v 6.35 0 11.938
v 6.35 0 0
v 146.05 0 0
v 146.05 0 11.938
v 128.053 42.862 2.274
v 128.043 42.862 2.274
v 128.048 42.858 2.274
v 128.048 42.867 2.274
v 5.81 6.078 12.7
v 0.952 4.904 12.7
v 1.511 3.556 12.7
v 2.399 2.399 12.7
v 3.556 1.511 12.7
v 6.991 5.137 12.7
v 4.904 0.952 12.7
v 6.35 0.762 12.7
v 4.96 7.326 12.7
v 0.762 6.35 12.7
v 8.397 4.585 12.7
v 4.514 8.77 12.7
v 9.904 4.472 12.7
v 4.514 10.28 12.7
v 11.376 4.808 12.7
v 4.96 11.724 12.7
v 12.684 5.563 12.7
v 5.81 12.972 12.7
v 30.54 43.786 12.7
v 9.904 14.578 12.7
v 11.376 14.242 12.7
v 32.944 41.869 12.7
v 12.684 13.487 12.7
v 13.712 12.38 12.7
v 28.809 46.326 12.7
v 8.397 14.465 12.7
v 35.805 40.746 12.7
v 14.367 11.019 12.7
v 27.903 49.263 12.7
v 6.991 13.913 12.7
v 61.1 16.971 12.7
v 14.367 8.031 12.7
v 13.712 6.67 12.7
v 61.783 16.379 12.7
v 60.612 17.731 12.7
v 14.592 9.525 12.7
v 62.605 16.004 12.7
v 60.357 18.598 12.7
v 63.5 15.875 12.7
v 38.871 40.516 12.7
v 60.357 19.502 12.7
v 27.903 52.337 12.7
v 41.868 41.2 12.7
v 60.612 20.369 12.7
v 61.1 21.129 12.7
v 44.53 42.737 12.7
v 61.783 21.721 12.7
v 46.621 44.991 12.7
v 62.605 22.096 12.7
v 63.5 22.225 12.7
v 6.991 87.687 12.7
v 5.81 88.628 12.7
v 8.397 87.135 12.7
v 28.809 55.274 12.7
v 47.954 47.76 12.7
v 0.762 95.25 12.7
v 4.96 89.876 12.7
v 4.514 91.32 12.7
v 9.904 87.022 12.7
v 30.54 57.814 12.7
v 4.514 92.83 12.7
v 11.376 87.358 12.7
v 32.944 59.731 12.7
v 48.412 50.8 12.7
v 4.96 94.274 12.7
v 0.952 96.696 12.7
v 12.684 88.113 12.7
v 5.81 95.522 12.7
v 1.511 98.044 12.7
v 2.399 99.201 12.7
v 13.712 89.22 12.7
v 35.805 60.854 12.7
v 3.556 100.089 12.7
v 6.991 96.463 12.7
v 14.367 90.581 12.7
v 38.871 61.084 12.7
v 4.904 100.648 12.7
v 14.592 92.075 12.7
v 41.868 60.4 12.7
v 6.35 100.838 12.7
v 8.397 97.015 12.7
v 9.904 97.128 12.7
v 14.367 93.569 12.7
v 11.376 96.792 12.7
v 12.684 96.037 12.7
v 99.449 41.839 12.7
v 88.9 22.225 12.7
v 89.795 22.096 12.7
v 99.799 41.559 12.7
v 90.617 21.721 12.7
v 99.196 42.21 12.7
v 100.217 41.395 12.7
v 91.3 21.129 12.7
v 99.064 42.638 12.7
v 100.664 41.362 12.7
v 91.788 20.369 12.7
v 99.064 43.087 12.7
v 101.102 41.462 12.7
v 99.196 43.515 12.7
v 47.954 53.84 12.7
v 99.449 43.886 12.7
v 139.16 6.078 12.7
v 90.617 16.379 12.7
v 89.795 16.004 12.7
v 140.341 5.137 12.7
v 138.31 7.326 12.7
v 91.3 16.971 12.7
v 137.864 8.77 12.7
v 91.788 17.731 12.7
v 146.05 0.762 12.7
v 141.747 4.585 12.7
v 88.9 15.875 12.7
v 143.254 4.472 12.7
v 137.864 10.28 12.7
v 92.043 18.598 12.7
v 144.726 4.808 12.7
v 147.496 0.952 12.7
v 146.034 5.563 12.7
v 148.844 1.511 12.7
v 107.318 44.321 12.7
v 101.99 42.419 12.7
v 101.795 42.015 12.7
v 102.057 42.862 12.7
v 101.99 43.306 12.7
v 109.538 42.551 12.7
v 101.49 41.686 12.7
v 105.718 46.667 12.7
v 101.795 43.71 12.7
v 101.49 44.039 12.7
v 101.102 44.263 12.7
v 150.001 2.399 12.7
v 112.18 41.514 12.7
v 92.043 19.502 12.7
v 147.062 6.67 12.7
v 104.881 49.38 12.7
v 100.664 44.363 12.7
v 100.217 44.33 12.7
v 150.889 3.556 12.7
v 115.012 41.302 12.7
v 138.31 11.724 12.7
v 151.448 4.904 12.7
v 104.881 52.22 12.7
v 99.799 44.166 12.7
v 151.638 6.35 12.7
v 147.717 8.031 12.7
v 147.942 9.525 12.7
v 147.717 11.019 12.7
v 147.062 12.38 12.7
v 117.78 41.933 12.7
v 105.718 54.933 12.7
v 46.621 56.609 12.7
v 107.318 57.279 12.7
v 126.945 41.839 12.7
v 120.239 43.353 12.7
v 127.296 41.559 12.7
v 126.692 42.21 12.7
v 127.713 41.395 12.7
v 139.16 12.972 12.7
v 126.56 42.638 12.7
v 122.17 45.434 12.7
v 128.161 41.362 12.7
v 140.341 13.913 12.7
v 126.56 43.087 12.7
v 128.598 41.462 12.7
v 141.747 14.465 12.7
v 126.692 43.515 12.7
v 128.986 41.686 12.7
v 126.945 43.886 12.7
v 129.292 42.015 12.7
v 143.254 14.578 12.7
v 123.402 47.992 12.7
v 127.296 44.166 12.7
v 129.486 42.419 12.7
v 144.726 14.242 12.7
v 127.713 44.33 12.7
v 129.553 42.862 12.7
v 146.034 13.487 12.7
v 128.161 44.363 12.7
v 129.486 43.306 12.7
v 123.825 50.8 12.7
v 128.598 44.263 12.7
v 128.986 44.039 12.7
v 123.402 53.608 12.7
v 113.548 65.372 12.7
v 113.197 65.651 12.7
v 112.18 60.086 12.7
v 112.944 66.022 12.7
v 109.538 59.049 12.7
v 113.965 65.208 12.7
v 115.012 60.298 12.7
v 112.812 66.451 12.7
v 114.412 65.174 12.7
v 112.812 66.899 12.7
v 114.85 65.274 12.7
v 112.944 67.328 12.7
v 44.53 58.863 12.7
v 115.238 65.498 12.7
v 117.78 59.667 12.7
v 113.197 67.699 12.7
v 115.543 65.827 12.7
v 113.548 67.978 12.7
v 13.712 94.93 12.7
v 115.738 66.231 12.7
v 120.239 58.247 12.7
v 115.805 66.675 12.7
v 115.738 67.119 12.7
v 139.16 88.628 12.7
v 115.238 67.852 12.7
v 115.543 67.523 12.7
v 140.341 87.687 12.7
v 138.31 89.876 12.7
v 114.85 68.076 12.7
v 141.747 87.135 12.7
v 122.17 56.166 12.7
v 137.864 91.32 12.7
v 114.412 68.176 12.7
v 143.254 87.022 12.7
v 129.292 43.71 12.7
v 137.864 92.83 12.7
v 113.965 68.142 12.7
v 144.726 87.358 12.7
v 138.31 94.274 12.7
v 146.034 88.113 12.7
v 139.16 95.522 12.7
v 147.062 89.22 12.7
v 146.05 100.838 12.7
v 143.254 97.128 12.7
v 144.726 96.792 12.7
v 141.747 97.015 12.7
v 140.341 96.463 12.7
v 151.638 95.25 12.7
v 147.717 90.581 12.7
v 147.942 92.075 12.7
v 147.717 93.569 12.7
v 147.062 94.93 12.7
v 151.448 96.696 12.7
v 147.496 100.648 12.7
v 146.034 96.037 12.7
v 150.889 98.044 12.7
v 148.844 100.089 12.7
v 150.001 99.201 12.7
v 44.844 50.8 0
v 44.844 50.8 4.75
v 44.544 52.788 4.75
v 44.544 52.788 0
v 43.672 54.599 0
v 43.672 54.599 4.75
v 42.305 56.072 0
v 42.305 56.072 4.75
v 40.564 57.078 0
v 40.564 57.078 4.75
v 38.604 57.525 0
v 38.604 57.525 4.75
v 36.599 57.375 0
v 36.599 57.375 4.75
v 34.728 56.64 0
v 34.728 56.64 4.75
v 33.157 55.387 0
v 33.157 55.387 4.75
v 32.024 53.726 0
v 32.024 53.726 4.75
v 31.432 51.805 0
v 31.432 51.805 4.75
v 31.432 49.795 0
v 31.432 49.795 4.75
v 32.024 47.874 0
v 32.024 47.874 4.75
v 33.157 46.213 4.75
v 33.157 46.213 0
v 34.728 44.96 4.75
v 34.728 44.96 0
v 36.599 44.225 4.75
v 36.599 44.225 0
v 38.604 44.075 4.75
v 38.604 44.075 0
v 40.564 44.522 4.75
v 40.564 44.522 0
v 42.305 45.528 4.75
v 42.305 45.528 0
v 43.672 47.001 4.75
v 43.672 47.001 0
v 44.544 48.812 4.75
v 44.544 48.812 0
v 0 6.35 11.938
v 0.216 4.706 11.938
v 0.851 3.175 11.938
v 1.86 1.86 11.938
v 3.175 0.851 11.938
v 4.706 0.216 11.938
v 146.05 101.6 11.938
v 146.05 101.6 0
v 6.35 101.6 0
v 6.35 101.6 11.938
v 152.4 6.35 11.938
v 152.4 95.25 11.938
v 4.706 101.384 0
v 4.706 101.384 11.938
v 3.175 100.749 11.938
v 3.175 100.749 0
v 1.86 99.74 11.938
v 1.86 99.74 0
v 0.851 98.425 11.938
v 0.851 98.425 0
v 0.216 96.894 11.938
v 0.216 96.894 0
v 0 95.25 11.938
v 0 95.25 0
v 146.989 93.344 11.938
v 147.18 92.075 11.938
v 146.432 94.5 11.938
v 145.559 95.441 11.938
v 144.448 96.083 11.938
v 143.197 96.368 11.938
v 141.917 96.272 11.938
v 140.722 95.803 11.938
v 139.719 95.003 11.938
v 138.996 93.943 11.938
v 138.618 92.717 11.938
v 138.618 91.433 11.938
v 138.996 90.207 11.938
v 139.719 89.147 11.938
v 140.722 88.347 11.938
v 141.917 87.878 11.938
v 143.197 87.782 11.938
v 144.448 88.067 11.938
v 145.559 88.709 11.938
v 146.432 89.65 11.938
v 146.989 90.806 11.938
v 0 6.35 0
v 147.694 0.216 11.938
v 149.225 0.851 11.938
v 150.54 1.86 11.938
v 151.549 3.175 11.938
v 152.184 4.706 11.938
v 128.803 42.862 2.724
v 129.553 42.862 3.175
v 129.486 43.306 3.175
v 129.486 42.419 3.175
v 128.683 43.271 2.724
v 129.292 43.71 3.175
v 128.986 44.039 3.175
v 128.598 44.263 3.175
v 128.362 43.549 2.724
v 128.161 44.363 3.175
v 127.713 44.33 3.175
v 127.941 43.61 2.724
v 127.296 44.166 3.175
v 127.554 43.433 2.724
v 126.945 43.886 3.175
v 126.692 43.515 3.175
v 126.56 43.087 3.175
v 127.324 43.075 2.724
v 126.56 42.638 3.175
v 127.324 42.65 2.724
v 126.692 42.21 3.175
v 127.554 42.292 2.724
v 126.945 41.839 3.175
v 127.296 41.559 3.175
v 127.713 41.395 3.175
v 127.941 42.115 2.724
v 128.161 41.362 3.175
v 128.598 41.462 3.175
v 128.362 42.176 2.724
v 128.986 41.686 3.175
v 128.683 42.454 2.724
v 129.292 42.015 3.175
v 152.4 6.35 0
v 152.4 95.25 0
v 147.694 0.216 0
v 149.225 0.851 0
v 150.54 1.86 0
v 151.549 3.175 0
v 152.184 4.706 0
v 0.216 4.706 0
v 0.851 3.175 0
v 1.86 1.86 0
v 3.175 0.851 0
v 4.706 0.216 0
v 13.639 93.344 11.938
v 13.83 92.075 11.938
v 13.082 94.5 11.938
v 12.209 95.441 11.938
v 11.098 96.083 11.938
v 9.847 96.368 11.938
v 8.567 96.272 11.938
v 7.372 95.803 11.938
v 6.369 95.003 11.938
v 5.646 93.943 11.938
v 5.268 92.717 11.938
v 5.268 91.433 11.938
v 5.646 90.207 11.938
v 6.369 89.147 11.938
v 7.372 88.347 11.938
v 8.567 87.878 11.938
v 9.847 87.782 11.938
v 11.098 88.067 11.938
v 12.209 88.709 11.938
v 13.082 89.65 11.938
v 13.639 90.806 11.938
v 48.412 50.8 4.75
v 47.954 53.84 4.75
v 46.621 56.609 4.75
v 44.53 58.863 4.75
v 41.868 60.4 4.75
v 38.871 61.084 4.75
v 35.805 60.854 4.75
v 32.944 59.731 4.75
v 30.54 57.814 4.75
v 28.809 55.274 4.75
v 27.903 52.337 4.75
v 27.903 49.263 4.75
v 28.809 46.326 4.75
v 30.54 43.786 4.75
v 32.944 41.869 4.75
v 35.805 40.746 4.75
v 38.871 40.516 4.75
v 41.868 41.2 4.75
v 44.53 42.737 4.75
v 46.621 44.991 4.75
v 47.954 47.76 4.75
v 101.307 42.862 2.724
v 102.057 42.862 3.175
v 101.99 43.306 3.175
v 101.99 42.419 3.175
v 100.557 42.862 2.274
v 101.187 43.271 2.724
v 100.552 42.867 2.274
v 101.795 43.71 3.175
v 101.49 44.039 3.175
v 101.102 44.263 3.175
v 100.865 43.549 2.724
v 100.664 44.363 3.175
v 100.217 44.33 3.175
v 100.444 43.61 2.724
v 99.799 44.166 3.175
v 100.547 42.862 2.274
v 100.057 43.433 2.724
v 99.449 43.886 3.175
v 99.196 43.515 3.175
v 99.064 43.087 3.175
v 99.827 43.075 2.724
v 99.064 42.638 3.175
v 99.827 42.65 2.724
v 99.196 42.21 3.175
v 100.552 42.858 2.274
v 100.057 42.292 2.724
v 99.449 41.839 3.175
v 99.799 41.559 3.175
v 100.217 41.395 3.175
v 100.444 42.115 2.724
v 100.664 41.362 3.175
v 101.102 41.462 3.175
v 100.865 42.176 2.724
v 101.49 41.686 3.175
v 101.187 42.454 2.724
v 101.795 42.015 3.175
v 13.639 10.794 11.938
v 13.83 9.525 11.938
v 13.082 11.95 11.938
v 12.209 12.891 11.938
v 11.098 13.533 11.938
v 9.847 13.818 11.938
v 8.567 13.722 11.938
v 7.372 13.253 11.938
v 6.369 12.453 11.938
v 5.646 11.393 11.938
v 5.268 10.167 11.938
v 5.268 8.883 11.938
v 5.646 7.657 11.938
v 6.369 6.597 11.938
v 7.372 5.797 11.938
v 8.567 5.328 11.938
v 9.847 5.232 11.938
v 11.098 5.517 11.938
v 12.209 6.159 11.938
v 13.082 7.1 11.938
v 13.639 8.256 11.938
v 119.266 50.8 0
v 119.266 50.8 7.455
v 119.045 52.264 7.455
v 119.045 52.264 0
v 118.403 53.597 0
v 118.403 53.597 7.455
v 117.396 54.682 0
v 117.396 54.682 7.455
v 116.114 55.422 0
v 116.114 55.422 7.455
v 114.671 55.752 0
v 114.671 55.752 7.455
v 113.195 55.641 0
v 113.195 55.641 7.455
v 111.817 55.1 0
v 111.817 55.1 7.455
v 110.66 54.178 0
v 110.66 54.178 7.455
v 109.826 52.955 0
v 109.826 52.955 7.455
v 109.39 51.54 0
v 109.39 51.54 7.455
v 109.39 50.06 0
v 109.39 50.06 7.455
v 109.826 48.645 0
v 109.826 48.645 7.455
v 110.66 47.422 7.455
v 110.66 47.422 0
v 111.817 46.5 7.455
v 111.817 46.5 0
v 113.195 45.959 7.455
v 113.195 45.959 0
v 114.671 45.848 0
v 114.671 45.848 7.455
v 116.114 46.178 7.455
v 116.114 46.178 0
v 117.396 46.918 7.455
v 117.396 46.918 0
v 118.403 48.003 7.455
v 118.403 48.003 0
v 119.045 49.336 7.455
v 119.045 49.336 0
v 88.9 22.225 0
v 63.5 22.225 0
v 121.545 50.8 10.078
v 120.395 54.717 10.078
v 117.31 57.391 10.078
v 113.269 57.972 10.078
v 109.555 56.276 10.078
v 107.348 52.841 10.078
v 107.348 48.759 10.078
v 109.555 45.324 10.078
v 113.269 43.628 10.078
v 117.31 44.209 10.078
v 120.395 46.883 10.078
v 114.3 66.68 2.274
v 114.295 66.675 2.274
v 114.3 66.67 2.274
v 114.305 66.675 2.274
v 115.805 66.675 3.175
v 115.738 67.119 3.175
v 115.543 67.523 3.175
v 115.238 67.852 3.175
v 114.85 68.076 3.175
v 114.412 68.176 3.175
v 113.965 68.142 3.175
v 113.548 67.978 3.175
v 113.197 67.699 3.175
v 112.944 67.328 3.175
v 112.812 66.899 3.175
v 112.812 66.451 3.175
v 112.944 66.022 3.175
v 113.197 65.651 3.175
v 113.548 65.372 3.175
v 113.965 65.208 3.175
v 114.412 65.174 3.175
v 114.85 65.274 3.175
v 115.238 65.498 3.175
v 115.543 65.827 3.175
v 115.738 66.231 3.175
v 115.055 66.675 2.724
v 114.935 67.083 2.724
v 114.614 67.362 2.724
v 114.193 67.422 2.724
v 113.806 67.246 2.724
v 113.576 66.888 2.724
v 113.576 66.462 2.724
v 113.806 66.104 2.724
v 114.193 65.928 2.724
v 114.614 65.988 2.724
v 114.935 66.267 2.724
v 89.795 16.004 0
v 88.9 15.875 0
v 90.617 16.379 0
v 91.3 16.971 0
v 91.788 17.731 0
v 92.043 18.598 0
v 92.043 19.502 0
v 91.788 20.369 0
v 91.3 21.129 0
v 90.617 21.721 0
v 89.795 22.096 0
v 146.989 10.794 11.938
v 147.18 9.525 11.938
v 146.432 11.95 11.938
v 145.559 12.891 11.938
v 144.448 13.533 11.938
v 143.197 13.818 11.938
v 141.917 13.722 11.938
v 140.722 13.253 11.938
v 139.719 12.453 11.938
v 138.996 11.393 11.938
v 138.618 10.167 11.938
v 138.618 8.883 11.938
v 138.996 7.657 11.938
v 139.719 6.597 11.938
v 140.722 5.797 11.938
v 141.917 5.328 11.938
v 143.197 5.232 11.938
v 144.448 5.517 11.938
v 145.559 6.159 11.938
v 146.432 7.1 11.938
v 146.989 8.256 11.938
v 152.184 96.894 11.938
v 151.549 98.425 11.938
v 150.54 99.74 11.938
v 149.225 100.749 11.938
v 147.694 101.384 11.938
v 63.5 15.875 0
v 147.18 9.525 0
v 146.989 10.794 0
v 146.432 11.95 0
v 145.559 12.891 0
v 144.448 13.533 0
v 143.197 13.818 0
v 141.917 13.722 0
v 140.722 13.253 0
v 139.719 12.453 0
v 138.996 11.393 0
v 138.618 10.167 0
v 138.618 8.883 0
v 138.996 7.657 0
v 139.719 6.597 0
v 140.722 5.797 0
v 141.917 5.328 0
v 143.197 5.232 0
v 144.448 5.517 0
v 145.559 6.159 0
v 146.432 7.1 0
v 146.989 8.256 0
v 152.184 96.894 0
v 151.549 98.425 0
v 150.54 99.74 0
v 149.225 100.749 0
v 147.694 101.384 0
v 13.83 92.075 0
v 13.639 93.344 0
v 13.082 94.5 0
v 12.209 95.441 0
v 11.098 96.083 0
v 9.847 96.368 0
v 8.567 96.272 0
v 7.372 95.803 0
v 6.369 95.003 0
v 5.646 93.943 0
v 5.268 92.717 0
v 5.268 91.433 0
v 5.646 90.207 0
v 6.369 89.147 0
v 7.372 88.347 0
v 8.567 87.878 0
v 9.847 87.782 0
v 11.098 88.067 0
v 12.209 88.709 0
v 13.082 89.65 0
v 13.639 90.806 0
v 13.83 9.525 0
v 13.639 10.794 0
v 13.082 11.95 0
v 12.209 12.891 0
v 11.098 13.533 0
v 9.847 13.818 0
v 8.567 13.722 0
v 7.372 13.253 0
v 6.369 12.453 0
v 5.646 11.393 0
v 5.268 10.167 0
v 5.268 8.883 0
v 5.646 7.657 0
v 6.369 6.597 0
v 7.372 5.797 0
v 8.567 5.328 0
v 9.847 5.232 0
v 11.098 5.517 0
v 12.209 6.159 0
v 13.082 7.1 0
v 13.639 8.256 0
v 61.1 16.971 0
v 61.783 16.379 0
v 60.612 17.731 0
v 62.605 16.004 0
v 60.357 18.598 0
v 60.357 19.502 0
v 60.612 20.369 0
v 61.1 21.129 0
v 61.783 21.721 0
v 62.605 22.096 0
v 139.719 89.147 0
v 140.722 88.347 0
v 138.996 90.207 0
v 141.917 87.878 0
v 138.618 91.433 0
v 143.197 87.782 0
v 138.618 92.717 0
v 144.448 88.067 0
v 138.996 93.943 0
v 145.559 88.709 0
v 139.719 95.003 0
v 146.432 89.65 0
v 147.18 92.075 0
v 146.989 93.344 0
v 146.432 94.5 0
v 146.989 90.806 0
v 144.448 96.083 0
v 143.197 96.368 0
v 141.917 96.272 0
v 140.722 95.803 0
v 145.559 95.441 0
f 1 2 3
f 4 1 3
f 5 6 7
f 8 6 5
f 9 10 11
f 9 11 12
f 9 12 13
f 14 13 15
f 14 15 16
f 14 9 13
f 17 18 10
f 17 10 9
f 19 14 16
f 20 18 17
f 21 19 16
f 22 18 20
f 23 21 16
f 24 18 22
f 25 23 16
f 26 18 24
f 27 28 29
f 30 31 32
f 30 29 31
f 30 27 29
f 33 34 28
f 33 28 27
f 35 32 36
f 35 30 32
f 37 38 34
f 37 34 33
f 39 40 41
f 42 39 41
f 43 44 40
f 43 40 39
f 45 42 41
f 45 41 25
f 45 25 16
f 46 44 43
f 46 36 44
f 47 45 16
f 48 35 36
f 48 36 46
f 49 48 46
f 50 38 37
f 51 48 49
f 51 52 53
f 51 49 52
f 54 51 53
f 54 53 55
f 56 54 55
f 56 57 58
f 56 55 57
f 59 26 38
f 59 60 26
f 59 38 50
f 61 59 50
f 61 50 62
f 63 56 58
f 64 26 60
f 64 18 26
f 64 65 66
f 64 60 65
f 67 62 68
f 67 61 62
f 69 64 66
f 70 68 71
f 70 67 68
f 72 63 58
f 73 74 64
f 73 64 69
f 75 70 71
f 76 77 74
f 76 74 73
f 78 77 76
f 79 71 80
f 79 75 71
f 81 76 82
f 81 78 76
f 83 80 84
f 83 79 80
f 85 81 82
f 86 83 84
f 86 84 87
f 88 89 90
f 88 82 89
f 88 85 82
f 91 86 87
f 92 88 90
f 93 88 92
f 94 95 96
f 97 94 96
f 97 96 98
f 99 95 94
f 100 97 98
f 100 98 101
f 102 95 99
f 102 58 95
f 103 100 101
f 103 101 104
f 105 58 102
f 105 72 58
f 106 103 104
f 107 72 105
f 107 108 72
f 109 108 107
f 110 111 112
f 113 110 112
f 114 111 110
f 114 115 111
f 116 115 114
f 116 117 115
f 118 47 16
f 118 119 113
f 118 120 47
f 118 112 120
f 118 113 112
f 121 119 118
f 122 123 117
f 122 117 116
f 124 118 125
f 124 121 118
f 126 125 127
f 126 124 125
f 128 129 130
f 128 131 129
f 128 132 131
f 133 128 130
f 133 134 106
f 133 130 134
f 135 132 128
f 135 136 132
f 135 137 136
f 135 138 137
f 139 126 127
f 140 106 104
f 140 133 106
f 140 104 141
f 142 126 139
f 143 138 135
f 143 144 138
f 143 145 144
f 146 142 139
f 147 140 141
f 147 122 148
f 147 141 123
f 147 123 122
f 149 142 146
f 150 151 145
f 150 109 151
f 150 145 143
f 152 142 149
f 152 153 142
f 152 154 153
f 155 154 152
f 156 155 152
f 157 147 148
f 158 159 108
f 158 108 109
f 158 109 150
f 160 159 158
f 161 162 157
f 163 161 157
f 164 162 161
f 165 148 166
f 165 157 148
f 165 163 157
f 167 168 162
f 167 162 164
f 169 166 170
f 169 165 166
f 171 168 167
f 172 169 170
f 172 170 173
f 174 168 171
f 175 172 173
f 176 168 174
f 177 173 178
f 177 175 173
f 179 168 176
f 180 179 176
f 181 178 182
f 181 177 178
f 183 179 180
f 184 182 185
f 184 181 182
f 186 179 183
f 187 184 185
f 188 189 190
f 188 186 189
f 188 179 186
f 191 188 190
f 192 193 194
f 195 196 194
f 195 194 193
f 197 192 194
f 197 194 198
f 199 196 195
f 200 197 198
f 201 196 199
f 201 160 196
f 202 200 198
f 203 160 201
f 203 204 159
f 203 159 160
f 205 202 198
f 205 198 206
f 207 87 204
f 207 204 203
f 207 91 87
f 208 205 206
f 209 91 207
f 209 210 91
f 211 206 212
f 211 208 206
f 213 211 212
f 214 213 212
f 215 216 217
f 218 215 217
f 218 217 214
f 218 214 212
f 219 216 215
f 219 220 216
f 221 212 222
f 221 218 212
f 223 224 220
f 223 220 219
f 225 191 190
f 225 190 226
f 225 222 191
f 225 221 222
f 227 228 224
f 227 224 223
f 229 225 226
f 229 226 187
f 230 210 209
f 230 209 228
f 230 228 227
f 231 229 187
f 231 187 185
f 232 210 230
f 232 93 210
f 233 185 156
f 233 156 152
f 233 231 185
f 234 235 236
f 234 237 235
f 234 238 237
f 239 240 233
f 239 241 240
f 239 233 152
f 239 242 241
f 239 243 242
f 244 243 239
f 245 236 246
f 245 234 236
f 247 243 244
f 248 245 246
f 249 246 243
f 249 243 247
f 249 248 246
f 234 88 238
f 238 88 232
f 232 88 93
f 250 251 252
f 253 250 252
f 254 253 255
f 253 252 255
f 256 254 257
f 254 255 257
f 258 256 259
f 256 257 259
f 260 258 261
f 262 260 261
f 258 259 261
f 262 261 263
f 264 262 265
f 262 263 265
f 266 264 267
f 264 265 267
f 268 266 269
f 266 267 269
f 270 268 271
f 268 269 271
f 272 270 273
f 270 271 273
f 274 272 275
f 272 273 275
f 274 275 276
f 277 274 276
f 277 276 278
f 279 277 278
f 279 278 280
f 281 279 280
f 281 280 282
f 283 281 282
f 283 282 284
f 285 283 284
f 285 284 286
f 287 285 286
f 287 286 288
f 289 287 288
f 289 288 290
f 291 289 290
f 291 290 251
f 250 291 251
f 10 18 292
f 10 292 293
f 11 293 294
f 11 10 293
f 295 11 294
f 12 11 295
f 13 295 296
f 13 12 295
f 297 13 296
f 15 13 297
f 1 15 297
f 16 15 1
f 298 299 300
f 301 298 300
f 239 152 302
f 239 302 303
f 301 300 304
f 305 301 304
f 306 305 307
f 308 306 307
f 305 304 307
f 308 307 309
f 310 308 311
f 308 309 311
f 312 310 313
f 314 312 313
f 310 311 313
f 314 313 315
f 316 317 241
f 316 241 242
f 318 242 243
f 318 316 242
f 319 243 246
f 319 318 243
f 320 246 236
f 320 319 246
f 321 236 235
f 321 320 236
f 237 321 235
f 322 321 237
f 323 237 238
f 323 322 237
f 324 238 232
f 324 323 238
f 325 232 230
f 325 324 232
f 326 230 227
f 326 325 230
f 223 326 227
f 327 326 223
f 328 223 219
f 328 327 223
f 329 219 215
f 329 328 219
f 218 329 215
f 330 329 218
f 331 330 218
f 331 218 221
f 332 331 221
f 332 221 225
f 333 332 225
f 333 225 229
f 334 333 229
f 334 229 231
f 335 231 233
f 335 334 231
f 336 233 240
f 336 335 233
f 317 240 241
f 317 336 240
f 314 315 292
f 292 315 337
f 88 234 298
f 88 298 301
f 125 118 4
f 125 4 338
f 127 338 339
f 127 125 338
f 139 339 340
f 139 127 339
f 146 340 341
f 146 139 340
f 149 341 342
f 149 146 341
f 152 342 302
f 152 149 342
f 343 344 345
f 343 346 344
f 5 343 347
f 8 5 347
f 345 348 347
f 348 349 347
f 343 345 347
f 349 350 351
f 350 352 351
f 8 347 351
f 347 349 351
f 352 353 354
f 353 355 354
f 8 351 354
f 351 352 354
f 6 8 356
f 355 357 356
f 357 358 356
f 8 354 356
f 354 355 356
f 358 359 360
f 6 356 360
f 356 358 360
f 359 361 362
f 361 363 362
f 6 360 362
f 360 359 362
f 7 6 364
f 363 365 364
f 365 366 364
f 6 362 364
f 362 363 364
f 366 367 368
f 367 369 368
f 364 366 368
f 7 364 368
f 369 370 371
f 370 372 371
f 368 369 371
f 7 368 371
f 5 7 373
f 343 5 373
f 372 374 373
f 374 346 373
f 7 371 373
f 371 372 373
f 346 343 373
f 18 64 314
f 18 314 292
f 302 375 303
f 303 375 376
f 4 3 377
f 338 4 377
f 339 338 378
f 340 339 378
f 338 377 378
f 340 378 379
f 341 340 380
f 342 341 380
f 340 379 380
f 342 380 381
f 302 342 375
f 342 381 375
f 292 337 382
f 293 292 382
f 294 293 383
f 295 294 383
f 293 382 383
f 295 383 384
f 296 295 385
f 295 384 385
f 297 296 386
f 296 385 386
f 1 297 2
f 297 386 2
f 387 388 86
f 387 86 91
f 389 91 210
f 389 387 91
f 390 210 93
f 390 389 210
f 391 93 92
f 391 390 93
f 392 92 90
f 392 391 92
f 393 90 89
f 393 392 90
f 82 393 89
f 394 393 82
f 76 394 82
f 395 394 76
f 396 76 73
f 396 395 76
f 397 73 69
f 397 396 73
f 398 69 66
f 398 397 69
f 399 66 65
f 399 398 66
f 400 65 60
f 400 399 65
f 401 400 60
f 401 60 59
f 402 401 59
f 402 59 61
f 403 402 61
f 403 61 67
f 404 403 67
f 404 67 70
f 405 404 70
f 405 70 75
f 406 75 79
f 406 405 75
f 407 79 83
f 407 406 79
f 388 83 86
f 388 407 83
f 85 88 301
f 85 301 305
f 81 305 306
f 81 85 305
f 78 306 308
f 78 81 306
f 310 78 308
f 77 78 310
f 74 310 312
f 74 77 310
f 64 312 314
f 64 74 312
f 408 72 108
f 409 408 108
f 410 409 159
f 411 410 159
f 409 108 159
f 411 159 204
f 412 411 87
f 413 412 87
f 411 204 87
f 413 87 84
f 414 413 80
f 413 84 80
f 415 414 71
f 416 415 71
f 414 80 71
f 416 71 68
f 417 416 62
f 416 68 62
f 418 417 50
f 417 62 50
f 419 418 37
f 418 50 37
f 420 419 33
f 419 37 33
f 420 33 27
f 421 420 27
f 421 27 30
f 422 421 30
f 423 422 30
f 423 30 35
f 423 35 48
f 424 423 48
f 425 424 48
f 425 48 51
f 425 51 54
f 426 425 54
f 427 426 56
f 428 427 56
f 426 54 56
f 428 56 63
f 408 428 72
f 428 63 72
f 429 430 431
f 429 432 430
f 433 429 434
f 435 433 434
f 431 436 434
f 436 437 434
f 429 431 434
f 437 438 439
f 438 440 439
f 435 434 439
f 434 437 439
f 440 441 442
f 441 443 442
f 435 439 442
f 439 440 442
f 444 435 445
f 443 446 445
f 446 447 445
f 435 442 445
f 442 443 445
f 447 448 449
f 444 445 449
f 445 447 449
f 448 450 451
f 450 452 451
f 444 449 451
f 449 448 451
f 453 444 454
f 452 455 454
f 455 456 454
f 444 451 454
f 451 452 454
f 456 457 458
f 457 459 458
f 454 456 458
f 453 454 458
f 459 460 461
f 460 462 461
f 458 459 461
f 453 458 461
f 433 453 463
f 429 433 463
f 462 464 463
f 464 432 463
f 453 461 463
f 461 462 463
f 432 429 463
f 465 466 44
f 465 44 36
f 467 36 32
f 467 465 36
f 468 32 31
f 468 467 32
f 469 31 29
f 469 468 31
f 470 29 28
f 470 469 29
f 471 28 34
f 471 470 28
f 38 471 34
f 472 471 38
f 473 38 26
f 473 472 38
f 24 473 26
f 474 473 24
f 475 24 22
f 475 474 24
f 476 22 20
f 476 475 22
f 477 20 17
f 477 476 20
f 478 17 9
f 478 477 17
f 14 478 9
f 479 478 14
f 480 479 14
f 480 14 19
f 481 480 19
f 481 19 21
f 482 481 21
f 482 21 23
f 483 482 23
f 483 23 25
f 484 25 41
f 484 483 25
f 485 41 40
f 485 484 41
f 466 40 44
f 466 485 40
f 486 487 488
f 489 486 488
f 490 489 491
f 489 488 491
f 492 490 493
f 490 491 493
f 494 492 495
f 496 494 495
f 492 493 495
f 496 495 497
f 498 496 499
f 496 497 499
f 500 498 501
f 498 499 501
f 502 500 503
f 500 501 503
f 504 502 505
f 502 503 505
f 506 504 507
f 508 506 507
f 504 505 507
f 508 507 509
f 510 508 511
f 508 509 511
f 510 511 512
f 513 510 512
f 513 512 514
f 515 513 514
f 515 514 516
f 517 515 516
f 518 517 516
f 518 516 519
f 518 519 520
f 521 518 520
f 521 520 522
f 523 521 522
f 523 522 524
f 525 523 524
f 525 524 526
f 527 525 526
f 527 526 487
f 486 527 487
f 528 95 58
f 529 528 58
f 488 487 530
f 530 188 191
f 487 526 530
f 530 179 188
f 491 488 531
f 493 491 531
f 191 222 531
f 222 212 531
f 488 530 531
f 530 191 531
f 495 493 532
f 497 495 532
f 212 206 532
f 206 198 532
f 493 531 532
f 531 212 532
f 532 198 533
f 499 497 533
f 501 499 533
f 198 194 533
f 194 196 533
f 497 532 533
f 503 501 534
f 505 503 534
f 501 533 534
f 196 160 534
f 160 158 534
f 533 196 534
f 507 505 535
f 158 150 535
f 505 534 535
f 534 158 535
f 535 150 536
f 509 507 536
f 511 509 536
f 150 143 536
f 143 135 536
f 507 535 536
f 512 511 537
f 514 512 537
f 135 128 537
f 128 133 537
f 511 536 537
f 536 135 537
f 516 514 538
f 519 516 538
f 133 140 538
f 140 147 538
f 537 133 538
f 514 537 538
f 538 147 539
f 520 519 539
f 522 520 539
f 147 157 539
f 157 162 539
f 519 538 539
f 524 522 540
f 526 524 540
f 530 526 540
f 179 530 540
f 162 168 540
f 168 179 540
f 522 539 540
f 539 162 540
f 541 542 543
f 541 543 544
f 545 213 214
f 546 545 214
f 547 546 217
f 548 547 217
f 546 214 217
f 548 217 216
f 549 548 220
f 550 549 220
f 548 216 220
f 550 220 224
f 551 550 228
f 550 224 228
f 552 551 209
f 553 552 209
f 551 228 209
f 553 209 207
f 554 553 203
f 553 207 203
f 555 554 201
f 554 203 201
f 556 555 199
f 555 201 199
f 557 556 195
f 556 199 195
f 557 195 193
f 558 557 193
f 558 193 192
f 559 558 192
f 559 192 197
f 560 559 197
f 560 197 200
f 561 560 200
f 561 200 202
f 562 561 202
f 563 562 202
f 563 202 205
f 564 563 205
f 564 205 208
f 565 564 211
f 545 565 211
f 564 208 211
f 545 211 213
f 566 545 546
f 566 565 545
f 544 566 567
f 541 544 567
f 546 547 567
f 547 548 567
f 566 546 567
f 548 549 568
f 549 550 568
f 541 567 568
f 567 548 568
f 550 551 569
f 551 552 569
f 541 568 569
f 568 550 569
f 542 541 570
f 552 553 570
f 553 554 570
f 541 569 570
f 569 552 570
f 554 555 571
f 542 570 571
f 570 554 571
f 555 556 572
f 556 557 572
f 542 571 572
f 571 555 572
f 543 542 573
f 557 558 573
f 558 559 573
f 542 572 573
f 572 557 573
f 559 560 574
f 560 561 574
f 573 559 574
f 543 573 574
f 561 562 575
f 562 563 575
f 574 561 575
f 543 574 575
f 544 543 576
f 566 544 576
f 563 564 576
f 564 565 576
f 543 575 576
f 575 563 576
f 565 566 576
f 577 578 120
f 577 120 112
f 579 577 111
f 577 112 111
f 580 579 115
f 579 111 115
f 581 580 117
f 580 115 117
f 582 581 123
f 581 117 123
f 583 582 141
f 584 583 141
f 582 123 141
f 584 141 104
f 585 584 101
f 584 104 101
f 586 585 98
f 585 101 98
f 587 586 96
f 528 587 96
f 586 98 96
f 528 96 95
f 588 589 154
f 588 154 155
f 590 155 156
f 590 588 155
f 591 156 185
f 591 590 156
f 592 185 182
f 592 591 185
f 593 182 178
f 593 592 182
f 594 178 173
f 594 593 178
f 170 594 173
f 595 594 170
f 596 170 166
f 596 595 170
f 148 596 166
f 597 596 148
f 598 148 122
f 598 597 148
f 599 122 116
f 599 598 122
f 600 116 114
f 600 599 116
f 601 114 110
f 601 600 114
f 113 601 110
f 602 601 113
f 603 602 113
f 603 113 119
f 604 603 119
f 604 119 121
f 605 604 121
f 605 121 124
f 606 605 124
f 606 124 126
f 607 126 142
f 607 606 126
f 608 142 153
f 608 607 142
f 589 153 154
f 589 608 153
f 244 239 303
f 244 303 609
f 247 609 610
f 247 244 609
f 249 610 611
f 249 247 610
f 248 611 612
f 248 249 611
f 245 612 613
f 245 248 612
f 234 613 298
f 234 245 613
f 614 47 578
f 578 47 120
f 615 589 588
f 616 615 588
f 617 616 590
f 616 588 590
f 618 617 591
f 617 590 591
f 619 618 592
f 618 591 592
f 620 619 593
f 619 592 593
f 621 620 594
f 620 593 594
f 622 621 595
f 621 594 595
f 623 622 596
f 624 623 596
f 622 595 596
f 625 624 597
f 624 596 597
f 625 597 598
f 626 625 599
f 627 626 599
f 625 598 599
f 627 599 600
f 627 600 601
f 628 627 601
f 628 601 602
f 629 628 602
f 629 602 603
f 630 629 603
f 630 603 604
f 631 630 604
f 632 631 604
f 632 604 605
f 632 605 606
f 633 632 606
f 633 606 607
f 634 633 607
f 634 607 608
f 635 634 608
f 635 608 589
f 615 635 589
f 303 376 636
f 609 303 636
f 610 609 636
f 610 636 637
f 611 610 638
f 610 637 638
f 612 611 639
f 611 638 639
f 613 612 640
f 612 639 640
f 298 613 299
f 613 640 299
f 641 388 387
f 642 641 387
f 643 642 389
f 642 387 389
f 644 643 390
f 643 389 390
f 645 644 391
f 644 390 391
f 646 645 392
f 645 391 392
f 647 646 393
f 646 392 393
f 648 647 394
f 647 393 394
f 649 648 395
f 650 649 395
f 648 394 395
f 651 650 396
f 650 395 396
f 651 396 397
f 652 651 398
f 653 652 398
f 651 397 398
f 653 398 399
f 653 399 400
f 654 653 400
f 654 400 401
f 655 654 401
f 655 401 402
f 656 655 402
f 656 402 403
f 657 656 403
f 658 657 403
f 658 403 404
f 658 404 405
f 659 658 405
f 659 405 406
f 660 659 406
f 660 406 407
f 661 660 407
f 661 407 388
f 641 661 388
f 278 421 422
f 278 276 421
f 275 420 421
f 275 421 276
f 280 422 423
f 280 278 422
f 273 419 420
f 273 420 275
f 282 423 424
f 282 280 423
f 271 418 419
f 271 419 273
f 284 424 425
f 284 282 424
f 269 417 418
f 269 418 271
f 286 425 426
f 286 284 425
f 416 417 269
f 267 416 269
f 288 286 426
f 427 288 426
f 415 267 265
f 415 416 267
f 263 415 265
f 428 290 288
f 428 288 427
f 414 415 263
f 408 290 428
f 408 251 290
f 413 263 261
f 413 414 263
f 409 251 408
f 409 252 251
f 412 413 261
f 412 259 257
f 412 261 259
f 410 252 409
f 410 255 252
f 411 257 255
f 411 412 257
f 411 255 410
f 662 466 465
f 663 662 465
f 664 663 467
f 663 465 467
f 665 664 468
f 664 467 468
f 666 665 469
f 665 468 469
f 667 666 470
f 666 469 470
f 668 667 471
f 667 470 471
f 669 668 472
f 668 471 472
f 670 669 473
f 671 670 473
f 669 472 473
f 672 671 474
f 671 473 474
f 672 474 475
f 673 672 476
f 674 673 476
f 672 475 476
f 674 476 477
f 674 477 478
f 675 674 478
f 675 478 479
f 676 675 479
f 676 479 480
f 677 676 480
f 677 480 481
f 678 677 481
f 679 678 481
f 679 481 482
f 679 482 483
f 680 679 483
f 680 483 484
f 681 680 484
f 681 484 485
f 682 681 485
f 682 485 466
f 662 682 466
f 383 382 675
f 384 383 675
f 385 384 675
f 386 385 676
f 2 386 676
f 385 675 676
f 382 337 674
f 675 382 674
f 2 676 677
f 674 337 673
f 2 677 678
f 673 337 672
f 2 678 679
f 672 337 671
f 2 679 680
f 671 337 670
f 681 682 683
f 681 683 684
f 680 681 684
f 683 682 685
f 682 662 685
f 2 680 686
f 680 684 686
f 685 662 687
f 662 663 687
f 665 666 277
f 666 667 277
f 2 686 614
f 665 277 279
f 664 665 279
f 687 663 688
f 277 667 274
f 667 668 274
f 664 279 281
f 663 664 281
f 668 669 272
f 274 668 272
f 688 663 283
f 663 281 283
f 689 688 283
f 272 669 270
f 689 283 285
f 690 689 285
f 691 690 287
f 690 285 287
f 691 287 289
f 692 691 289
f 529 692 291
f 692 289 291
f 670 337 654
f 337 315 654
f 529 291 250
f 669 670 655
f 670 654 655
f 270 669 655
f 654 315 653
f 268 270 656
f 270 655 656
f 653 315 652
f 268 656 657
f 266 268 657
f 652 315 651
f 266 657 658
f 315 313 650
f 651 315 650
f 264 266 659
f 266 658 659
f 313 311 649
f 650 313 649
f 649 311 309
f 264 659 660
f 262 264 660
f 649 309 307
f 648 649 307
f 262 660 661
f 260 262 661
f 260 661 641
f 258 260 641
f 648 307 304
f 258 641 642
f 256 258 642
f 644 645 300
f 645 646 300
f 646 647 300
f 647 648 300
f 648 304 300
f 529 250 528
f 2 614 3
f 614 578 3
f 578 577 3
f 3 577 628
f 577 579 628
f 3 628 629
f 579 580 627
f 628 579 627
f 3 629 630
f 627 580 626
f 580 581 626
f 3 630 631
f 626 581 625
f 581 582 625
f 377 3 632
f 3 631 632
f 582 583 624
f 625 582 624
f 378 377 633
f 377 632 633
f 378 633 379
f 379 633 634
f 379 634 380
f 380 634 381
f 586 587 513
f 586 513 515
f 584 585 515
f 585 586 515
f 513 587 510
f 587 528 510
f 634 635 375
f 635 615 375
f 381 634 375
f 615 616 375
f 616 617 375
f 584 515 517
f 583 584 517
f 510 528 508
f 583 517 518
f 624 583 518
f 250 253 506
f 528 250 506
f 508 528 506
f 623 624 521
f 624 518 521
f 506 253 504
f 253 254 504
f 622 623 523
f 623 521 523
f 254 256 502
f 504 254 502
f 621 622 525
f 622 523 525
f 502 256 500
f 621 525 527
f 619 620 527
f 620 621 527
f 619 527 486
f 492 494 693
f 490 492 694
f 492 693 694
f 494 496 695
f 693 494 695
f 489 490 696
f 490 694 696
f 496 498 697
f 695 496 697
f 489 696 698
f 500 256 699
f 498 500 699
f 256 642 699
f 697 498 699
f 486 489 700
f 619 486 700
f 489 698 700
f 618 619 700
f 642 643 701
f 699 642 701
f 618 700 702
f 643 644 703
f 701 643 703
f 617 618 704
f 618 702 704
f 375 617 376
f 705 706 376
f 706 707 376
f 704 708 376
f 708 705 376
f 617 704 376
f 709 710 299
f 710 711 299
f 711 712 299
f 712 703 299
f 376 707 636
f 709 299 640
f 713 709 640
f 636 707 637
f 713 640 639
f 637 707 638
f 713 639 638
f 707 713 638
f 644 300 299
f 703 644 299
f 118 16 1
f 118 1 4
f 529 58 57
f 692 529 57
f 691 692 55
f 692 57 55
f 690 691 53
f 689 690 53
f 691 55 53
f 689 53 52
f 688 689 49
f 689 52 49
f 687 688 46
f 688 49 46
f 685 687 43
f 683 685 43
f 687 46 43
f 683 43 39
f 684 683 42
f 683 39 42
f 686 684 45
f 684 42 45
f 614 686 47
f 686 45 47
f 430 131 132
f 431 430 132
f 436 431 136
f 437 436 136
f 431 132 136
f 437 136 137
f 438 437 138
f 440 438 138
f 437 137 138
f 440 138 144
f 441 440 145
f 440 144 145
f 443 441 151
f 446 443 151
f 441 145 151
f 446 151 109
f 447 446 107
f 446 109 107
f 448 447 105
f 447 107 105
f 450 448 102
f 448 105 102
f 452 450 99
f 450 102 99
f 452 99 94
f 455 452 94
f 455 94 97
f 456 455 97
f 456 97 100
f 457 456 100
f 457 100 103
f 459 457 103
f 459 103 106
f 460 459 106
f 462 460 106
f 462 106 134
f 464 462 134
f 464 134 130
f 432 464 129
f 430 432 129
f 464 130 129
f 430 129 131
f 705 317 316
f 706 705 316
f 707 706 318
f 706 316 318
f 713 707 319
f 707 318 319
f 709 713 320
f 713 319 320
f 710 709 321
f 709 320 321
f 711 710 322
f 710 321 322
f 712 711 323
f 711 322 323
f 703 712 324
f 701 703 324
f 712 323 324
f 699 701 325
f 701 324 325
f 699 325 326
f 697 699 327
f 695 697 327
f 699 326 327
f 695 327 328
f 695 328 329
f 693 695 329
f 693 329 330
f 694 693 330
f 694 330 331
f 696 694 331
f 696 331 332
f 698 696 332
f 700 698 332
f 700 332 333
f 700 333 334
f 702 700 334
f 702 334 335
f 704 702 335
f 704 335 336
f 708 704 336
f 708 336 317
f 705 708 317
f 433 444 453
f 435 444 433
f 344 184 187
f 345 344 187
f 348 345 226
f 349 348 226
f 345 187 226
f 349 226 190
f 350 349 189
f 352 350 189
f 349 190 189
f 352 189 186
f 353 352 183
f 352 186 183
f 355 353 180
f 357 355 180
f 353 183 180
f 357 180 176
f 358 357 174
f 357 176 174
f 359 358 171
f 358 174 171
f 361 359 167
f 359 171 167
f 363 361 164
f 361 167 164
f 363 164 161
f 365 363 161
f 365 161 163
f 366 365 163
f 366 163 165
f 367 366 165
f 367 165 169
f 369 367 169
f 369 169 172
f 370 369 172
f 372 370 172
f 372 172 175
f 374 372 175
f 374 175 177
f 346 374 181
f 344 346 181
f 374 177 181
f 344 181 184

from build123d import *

# Parameters (mm, degrees)
EXTRUDE_1_DEPTH               = 12.7
SKETCH_2_R                    = 4.3053
CUT_EXTRUDE_1_DEPTH           = 184.601770144
CUT_EXTRUDE_2_DEPTH           = 184.601770144
SKETCH_4_R                    = 10.3124
CUT_EXTRUDE_3_DEPTH           = 7.9502
SKETCH_5_R                    = 6.7437
CUT_EXTRUDE_4_DEPTH           = 184.601770144
SKETCH_6_R                    = 9.525
CUT_EXTRUDE_5_DEPTH           = 5.244874679
CUT_EXTRUDE_5_DRAFT           = -41
SKETCH_7_R                    = 4.9657
CUT_EXTRUDE_6_DEPTH           = 184.601770144
SKETCH_8_R                    = 1.50495
CUT_EXTRUDE_7_DEPTH           = 9.525
SKETCH_9_R                    = 1.50495
CUT_EXTRUDE_8_DEPTH           = 0.901260886
CUT_EXTRUDE_8_DRAFT           = -59
CUT_EXTRUDE_8_PROFILE_2_DEPTH = 0.901260886
CUT_EXTRUDE_8_PROFILE_2_DRAFT = -59
CUT_EXTRUDE_8_PROFILE_3_DEPTH = 0.901260886
CUT_EXTRUDE_8_PROFILE_3_DRAFT = -59
CHAMFER_1_SIZE                = 0.762
CHAMFER_2_SIZE                = 0.762


with BuildPart() as part:
    # 草图1 → 凸台-拉伸1 (new body)
    with BuildSketch(Plane.XY):
        with BuildLine():
            Line((6.35, 0), (146.05, 0))
            ThreePointArc((146.05, 0), (150.540128061, 1.859871939), (152.4, 6.35))
            Line((152.4, 6.35), (152.4, 95.25))
            ThreePointArc((152.4, 95.25), (150.540128061, 99.740128061), (146.05, 101.6))
            Line((146.05, 101.6), (6.35, 101.6))
            ThreePointArc((6.35, 101.6), (1.859871939, 99.740128061), (0, 95.25))
            Line((0, 95.25), (0, 6.35))
            ThreePointArc((0, 6.35), (1.859871939, 1.859871939), (6.35, 0))
        make_face()
    extrude(amount=EXTRUDE_1_DEPTH)

    # 草图2 → 切除-拉伸1 (cut, through all)
    with BuildSketch(Plane.XY.offset(12.7)):
        with Locations((9.525, 9.525)):
            Circle(SKETCH_2_R)
        with Locations((142.875, 9.525)):
            Circle(SKETCH_2_R)
        with Locations((9.525, 92.075)):
            Circle(SKETCH_2_R)
        with Locations((142.875, 92.075)):
            Circle(SKETCH_2_R)
    extrude(amount=-CUT_EXTRUDE_1_DEPTH, mode=Mode.SUBTRACT)

    # 草图3 → 切除-拉伸2 (cut, through all)
    with BuildSketch(Plane.XY.offset(12.7)):
        with BuildLine():
            Line((63.5, 15.875), (88.9, 15.875))
            ThreePointArc((88.9, 15.875), (92.075, 19.05), (88.9, 22.225))
            Line((88.9, 22.225), (63.5, 22.225))
            ThreePointArc((63.5, 22.225), (60.325, 19.05), (63.5, 15.875))
        make_face()
    extrude(amount=-CUT_EXTRUDE_2_DEPTH, mode=Mode.SUBTRACT)

    # 草图4 → 切除-拉伸3 (cut)
    with BuildSketch(Plane.XY.offset(12.7)):
        with Locations((38.1, 50.8)):
            Circle(SKETCH_4_R)
    extrude(amount=-CUT_EXTRUDE_3_DEPTH, mode=Mode.SUBTRACT)

    # 草图5 → 切除-拉伸4 (cut, through all)
    with BuildSketch(Plane.XY.offset(12.7)):
        with Locations((38.1, 50.8)):
            Circle(SKETCH_5_R)
    extrude(amount=-CUT_EXTRUDE_4_DEPTH, mode=Mode.SUBTRACT)


with BuildPart() as cut_extrude_5_tool:
    # 草图6 → 切除-拉伸5 (with draft: the straight prism first)
    with BuildSketch(Plane.XY.offset(12.7)):
        with Locations((114.3, 50.8)):
            Circle(SKETCH_6_R)
    extrude(amount=-CUT_EXTRUDE_5_DEPTH)
    # 切除-拉伸5: the draft: its side faces are tilted about the plane it starts from
    cut_extrude_5_sides = [cut_extrude_5_tool.faces().sort_by_distance(p)[0] for p in [
        (104.775, 50.8, 10.07756266),
    ]]
    draft(cut_extrude_5_sides, Plane.XY.offset(12.7), CUT_EXTRUDE_5_DRAFT)


with BuildPart() as part_1:
    add(part.part)

    # 切除-拉伸5: cut by cut_extrude_5_tool
    add(cut_extrude_5_tool.part, mode=Mode.SUBTRACT)

    # 草图7 → 切除-拉伸6 (cut, through all)
    with BuildSketch(Plane.XY.offset(12.7)):
        with Locations((114.3, 50.8)):
            Circle(SKETCH_7_R)
    extrude(amount=-CUT_EXTRUDE_6_DEPTH, mode=Mode.SUBTRACT)

    # 草图8 → 切除-拉伸7 (cut)
    with BuildSketch(Plane.XY.offset(12.7)):
        with Locations((114.3, 66.675)):
            Circle(SKETCH_8_R)
        with Locations((100.551847, 42.8625)):
            Circle(SKETCH_8_R)
        with Locations((128.048153, 42.8625)):
            Circle(SKETCH_8_R)
    extrude(amount=-CUT_EXTRUDE_7_DEPTH, mode=Mode.SUBTRACT)


with BuildPart() as cut_extrude_8_tool:
    # 草图9 → 切除-拉伸8 (with draft: the straight prism first)
    with BuildSketch(Plane.XY.offset(3.175)):
        with Locations((114.3, 66.675)):
            Circle(SKETCH_9_R)
    extrude(amount=-CUT_EXTRUDE_8_DEPTH)
    # 切除-拉伸8: the draft: its side faces are tilted about the plane it starts from
    cut_extrude_8_sides = [cut_extrude_8_tool.faces().sort_by_distance(p)[0] for p in [
        (112.79505, 66.675, 2.724369557),
    ]]
    draft(cut_extrude_8_sides, Plane.XY.offset(3.175), CUT_EXTRUDE_8_DRAFT)


with BuildPart() as part_2:
    add(part_1.part)

    # 切除-拉伸8: cut by cut_extrude_8_tool
    add(cut_extrude_8_tool.part, mode=Mode.SUBTRACT)


with BuildPart() as cut_extrude_8_profile_2_tool:
    # 草图9 → 切除-拉伸8 profile 2 (with draft: the straight prism first)
    with BuildSketch(Plane.XY.offset(3.175)):
        with Locations((100.551847, 42.8625)):
            Circle(SKETCH_9_R)
    extrude(amount=-CUT_EXTRUDE_8_PROFILE_2_DEPTH)
    # 切除-拉伸8 profile 2: the draft: its side faces are tilted about the plane it starts from
    cut_extrude_8_profile_2_sides = [cut_extrude_8_profile_2_tool.faces().sort_by_distance(p)[0] for p in [
        (99.046897, 42.8625, 2.724369557),
    ]]
    draft(cut_extrude_8_profile_2_sides, Plane.XY.offset(3.175), CUT_EXTRUDE_8_PROFILE_2_DRAFT)


with BuildPart() as part_3:
    add(part_2.part)

    # 切除-拉伸8 profile 2: cut by cut_extrude_8_profile_2_tool
    add(cut_extrude_8_profile_2_tool.part, mode=Mode.SUBTRACT)


with BuildPart() as cut_extrude_8_profile_3_tool:
    # 草图9 → 切除-拉伸8 profile 3 (with draft: the straight prism first)
    with BuildSketch(Plane.XY.offset(3.175)):
        with Locations((128.048153, 42.8625)):
            Circle(SKETCH_9_R)
    extrude(amount=-CUT_EXTRUDE_8_PROFILE_3_DEPTH)
    # 切除-拉伸8 profile 3: the draft: its side faces are tilted about the plane it starts from
    cut_extrude_8_profile_3_sides = [cut_extrude_8_profile_3_tool.faces().sort_by_distance(p)[0] for p in [
        (126.543203, 42.8625, 2.724369557),
    ]]
    draft(cut_extrude_8_profile_3_sides, Plane.XY.offset(3.175), CUT_EXTRUDE_8_PROFILE_3_DRAFT)


with BuildPart() as part_4:
    add(part_3.part)

    # 切除-拉伸8 profile 3: cut by cut_extrude_8_profile_3_tool
    add(cut_extrude_8_profile_3_tool.part, mode=Mode.SUBTRACT)

    # 倒角1
    chamfer_1_edges = [part_4.edges().sort_by_distance(p)[0] for p in [
        (150.540128061, 1.859871939, 12.7),
        (152.4, 50.8, 12.7),
        (150.540128061, 99.740128061, 12.7),
        (76.2, 101.6, 12.7),
        (1.859871939, 99.740128061, 12.7),
        (0, 50.8, 12.7),
        (1.859871939, 1.859871939, 12.7),
        (76.2, 0, 12.7),
    ]]
    chamfer(chamfer_1_edges, length=CHAMFER_1_SIZE)

    # 倒角2
    chamfer_2_edges = [part_4.edges().sort_by_distance(p)[0] for p in [
        (138.5697, 9.525, 12.7),
        (5.2197, 92.075, 12.7),
        (138.5697, 92.075, 12.7),
        (5.2197, 9.525, 12.7),
    ]]
    chamfer(chamfer_2_edges, length=CHAMFER_2_SIZE)


solid = part_4.part
